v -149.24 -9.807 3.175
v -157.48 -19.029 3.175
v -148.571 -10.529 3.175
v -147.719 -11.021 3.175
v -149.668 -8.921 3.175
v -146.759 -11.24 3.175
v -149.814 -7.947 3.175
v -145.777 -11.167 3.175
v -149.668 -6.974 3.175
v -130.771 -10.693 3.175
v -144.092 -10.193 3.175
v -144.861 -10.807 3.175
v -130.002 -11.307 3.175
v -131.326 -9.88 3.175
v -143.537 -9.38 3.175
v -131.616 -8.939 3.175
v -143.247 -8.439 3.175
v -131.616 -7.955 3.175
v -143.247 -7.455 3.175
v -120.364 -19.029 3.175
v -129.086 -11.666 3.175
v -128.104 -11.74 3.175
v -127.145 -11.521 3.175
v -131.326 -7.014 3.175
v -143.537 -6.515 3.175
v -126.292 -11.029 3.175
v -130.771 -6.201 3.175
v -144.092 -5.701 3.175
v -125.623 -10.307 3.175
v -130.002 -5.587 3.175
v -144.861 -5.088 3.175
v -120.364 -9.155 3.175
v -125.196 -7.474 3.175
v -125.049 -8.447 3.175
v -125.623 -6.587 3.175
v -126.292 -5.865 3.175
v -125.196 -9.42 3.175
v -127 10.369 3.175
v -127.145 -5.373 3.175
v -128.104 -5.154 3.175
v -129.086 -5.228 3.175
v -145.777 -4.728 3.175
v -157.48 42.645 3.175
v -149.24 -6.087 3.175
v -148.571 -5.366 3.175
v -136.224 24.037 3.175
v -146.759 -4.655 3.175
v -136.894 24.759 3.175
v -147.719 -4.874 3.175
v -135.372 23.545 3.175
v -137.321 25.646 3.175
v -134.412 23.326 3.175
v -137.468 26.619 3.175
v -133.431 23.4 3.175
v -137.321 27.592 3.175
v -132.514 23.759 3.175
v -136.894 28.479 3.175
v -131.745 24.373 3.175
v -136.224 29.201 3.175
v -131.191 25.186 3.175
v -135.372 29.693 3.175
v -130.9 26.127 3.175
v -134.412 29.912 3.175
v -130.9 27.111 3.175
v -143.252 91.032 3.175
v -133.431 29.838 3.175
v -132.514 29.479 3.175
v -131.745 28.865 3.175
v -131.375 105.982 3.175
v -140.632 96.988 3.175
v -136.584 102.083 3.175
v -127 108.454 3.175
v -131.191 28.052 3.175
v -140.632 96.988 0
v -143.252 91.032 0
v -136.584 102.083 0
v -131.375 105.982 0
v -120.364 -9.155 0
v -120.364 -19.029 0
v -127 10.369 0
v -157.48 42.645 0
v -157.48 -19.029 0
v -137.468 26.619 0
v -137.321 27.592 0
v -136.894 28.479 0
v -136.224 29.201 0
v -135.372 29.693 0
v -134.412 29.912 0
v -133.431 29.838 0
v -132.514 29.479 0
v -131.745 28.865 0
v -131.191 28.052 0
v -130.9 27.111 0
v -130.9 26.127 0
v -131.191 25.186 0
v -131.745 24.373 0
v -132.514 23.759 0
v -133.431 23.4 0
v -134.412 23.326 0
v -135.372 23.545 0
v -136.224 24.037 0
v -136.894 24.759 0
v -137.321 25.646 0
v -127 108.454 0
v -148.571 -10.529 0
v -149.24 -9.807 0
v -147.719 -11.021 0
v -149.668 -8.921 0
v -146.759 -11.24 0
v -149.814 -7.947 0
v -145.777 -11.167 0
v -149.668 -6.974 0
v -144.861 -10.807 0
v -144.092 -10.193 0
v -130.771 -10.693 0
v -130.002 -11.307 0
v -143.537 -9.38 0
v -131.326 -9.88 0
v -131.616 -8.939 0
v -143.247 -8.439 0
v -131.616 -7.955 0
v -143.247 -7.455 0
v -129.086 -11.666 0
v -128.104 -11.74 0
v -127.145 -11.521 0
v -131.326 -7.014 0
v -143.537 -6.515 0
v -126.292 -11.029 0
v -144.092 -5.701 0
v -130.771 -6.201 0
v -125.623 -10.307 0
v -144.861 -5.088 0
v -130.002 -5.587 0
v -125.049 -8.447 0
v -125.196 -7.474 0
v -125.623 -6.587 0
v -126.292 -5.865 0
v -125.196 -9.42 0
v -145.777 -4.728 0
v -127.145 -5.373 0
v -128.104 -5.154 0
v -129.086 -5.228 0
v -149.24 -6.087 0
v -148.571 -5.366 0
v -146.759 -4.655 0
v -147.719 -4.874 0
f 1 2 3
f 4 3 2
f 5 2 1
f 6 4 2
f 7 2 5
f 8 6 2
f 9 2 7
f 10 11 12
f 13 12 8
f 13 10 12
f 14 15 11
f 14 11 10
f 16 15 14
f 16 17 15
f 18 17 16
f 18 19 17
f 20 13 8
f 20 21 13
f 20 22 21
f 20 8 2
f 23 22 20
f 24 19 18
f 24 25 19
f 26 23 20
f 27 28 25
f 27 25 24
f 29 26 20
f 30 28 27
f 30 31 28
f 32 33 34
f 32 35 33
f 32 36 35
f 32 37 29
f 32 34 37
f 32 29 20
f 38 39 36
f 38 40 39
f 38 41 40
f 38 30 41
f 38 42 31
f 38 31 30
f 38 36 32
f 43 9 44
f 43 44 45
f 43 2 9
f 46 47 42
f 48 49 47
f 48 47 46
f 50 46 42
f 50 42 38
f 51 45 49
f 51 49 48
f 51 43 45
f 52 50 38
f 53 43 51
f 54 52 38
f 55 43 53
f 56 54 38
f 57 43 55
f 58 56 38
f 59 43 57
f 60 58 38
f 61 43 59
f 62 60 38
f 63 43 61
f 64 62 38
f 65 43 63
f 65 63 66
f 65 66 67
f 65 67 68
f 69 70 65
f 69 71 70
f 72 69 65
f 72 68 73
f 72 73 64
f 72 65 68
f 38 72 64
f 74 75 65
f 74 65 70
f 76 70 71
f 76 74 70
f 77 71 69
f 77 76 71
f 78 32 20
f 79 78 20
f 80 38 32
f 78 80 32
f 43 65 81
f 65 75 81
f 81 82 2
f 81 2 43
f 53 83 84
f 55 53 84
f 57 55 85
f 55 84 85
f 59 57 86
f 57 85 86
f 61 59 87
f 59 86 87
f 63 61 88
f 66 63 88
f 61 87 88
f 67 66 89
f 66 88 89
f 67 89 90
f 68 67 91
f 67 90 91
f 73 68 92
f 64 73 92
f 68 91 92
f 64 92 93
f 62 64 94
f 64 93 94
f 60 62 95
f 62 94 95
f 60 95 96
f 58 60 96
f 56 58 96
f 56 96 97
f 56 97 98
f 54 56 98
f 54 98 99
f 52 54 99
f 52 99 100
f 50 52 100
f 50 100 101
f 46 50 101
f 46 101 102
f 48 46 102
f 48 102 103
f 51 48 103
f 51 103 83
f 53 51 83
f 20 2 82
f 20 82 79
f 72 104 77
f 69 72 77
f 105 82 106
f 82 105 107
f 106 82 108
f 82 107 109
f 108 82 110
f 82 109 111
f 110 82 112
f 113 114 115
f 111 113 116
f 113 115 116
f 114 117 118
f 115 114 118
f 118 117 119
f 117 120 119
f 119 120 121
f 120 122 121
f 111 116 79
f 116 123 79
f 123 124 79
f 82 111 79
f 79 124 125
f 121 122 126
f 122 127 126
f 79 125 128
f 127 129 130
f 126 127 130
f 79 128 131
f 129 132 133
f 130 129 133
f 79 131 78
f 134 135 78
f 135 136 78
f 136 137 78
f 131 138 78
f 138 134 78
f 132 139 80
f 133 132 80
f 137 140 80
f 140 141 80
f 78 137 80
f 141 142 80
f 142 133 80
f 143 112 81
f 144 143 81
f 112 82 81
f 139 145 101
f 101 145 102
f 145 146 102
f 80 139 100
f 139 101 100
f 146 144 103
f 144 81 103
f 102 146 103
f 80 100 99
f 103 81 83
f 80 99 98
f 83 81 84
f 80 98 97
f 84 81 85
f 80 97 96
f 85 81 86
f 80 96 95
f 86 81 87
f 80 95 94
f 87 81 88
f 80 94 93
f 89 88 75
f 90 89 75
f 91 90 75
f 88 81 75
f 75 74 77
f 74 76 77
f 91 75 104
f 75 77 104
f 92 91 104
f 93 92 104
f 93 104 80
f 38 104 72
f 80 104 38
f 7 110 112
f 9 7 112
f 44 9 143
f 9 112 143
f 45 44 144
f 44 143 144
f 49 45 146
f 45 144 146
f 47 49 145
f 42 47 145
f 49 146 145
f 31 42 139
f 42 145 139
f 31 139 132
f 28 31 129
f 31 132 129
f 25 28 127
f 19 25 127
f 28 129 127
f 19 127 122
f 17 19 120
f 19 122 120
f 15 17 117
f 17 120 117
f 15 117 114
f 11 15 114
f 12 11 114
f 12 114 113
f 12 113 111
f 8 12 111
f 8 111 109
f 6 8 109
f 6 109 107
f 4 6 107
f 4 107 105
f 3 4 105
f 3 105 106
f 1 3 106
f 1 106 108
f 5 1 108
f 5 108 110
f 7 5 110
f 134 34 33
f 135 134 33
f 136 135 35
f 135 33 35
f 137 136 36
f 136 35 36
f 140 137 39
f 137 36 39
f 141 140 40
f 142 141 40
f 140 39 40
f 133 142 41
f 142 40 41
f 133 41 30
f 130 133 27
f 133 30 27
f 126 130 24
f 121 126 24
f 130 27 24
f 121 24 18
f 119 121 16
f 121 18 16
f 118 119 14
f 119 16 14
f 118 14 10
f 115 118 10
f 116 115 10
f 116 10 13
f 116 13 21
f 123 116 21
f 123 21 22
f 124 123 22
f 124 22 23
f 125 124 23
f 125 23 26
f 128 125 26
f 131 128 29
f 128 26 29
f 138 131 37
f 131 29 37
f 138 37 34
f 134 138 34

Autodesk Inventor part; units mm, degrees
ref_plane "YZ Plane" through (0, 0, 0) normal (1, 0, 0) x (0, 1, 0)
ref_plane "XZ Plane" through (0, 0, 0) normal (0, 1, 0) x (-1, 0, 0)
ref_plane "XY Plane" through (0, 0, 0) normal (0, 0, 1) x (1, 0, 0)
sketch "Sketch1" plane through (0, 0, 0) normal (0, 0, 1) x (1, 0, 0)
  line L0 (-114.3, 77.8543) -> (-127, 77.8543)
  line L1 (-127, 77.8543) -> (-163.2323, 36.0005)
  arc A0 (-163.2323, 36.0005) -> (-215.9, -105.3078) centre (0, -105.3078) ccw
  line L2 (-152.4, -105.3078) -> (-215.9, -105.3078)
  arc A1 (152.4, -105.3078) -> (-152.4, -105.3078) centre (0, -105.3078) ccw
  line L3 (215.9, -105.3078) -> (152.4, -105.3078)
  arc A2 (215.9, -105.3078) -> (163.2323, 36.0005) centre (0, -105.3078) ccw
  line L4 (163.2323, 36.0005) -> (127, 77.8543)
  line L5 (127, 77.8543) -> (114.3, 77.8543)
  line L6 (114.3, 77.8543) -> (114.3, 90.5543)
  line L7 (114.3, 90.5543) -> (46.5518, 105.5138)
  arc A3 (46.5518, 105.5138) -> (-46.5518, 105.5138) centre (0, -105.3078) ccw
  line L8 (-46.5518, 105.5138) -> (-114.3, 90.5543)
  line L9 (-114.3, 90.5543) -> (-114.3, 77.8543)
  circle A4 centre (-174.6359, -42.9949) radius 3.302
  circle A5 centre (-181.5133, -67.4461) radius 3.302
  circle A6 centre (-184.9846, -92.6078) radius 3.302
  circle A7 centre (-12.7, 63.1241) radius 3.302
  circle A8 centre (-37.8617, 76.2055) radius 3.302
  circle A9 centre (-62.0706, 51.784) radius 3.302
  circle A10 centre (12.7, 63.1241) radius 3.302
  circle A11 centre (62.0706, 51.784) radius 3.302
  circle A12 centre (62.3129, 69.3281) radius 3.302
  circle A13 centre (174.6359, -42.9949) radius 3.302
  circle A14 centre (164.6231, -67.4949) radius 3.302
  circle A15 centre (181.5133, -67.4461) radius 3.302
  circle A16 centre (184.9846, -92.6078) radius 3.302
  circle A17 centre (168.4319, -92.6078) radius 3.302
  circle A18 centre (157.0918, -43.2372) radius 3.302
  circle A19 centre (37.8617, 76.2055) radius 3.302
  circle A20 centre (37.8128, 59.3154) radius 3.302
  circle A21 centre (12.7, 79.6768) radius 3.302
  circle A22 centre (-62.3129, 69.3281) radius 3.302
  circle A23 centre (-37.8128, 59.3154) radius 3.302
  circle A24 centre (-12.7, 79.6768) radius 3.302
  circle A25 centre (-168.4319, -92.6078) radius 3.302
  circle A26 centre (-164.6231, -67.4949) radius 3.302
  circle A27 centre (-157.0918, -43.2372) radius 3.302
  line L10 (-127, 143.7166) -> (-127, -105.3078)
  line L11 (-127, -21.0655) -> (-127, 108.4537)
  line L12 (-142.24, -21.0655) -> (-142.24, 38.6612) construction
  circle A28 centre (-142.24, -7.2274) radius 3.302
  circle A29 centre (-142.24, 18.1726) radius 3.302
  line L13 (-157.48, -21.0655) -> (-157.48, 42.6453)
  line L14 (-127, -21.0655) -> (-157.48, -21.0655)
  line L15 (-127, 108.4537) -> (-131.3752, 105.9825)
  line L16 (-143.2518, 91.0321) -> (-157.48, 42.6453)
  arc A30 (-131.3752, 105.9825) -> (-143.2518, 91.0321) centre (-118.8834, 83.8665) ccw
  circle A31 centre (142.24, 14.8706) radius 3.302
  circle A32 centre (-142.24, 14.8706) radius 3.302
  circle A33 centre (-142.24, -10.5294) radius 3.302
  circle A34 centre (142.24, -10.5294) radius 3.302
  point P0 (0, 0)
  dimension "d1" = 6.604
  dimension "d2" = 6.604
  dimension "d3" = 25.4
  dimension "d6" = 15.24
  dimension "d7" = 15.24
  dimension "d8" = 25.4
extrude "Extrusion1" add sketch "Sketch1" along normal blind 3.175 contours L10 L14 L13 L1 | L1 L16 A30 L15 L10 | A28 A33 | A29 A32 picked at (-142.4059, -12.7065) picked at (-142.4059, 12.6935)
sketch "Sketch2" plane through (0, 0, 0) normal (0, 0, -1) x (-1, 0, 0)
  line L0 (127, -21.0655) -> (127, 108.4537)
  line L1 (157.48, 42.6453) -> (157.48, -21.0655)
  line L2 (127, -21.0655) -> (157.48, -21.0655)
  line L3 (157.48, -21.0655) -> (157.48, -15.2234)
  line L4 (157.48, -15.2234) -> (127, -15.2234)
  line L5 (127, -15.2234) -> (127, -21.0655)
  point P0 (0, 0)
extrude "Extrusion2" cut sketch "Sketch2" against normal blind 25.4
sketch "Sketch3" plane through (0, 0, 0) normal (0, 0, -1) x (-1, 0, 0)
  line L0 (127, -15.2234) -> (157.48, -15.2234)
  line L1 (157.48, 42.6453) -> (157.48, -15.2234)
  line L2 (143.2518, 91.0321) -> (157.48, 42.6453)
  arc A0 (143.2518, 91.0321) -> (131.3752, 105.9825) centre (118.8834, 83.8665) ccw
  line L3 (127, 108.4537) -> (131.3752, 105.9825)
  line L4 (127, -15.2234) -> (127, 108.4537)
  circle A1 centre (142.24, 18.1726) radius 3.302
  circle A2 centre (142.24, -7.2274) radius 3.302
  circle A3 centre (128.3509, -8.4471) radius 3.302
  line L5 (157.48, 42.6453) -> (157.48, -15.2234)
  line L6 (157.48, -15.2234) -> (127, -15.2234)
  line L7 (127, -15.2234) -> (127, -19.0291)
  line L8 (127, -19.0291) -> (157.48, -19.0291)
  line L9 (157.48, -19.0291) -> (157.48, -15.2234)
  circle A4 centre (25.4, 77.2006) radius 3.302
  circle A5 centre (50.4225, 72.8376) radius 3.302
  circle A6 centre (73.8239, 46.08) radius 3.302
  circle A7 centre (159.4716, -56.8709) radius 3.302
  circle A8 centre (155.1086, -31.8485) radius 3.302
  circle A9 centre (146.5122, -7.9473) radius 3.302
  circle A10 centre (137.9833, -107.1921) radius 3.302
  circle A11 centre (159.4716, -82.2709) radius 3.302
  circle A12 centre (146.5122, -131.1945) radius 3.302
  circle A13 centre (74.3236, -203.3832) radius 3.302
  circle A14 centre (25.4, -199.763) radius 3.302
  circle A15 centre (25.4, -216.3425) radius 3.302
  circle A16 centre (50.4225, -211.9795) radius 3.302
  circle A17 centre (50.3212, -194.8542) radius 3.302
  circle A18 centre (73.8239, -185.2218) radius 3.302
  circle A19 centre (155.1086, -107.2934) radius 3.302
  circle A20 centre (142.892, -82.2709) radius 3.302
  circle A21 centre (128.3509, -130.6948) radius 3.302
  circle A22 centre (128.3509, -8.4471) radius 3.302
  circle A23 centre (137.9833, -31.9498) radius 3.302
  circle A24 centre (142.892, -56.8709) radius 3.302
  circle A25 centre (74.3236, 64.2413) radius 3.302
  circle A26 centre (50.3212, 55.7124) radius 3.302
  circle A27 centre (25.4, 60.6211) radius 3.302
  arc A28 (12.7, -234.6709) -> (12.7, 95.5291) centre (12.7, -69.5709) ccw
  line L10 (12.7, 95.5291) -> (12.7, 44.7291)
  arc A29 (12.7, -183.8709) -> (12.7, 44.7291) centre (12.7, -69.5709) ccw
  line L11 (12.7, -183.8709) -> (12.7, -234.6709)
  line L12 (142.24, -19.0291) -> (127, 3.43)
  point P0 (0, 0)
extrude "Extrusion4" add sketch "Sketch3" against normal blind 3.175 contours L12 L4 A28 L1 L0 | L0 L9 L8 L12 | A28 L4 L3 A0 L2 L1 | A1 | A2 A9 | A9 A2 picked at (144.0113, -7.5677) picked at (141.8341, -7.293)
sketch "Sketch4" plane through (0, 0, 0) normal (0, 0, -1) x (-1, 0, 0)
  circle A0 centre (25.4, 77.2006) radius 3.302
  circle A1 centre (50.4225, 72.8376) radius 3.302
  circle A2 centre (73.8239, 46.08) radius 3.302
  circle A3 centre (159.4716, -56.8709) radius 3.302
  circle A4 centre (155.1086, -31.8485) radius 3.302
  circle A5 centre (146.5122, -7.9473) radius 3.302
  circle A6 centre (137.9833, -107.1921) radius 3.302
  circle A7 centre (159.4716, -82.2709) radius 3.302
  circle A8 centre (146.5122, -131.1945) radius 3.302
  circle A9 centre (74.3236, -203.3832) radius 3.302
  circle A10 centre (25.4, -199.763) radius 3.302
  circle A11 centre (25.4, -216.3425) radius 3.302
  circle A12 centre (50.4225, -211.9795) radius 3.302
  circle A13 centre (50.3212, -194.8542) radius 3.302
  circle A14 centre (73.8239, -185.2218) radius 3.302
  circle A15 centre (155.1086, -107.2934) radius 3.302
  circle A16 centre (142.892, -82.2709) radius 3.302
  circle A17 centre (128.3509, -130.6948) radius 3.302
  circle A18 centre (128.3509, -8.4471) radius 3.302
  circle A19 centre (137.9833, -31.9498) radius 3.302
  circle A20 centre (142.892, -56.8709) radius 3.302
  circle A21 centre (74.3236, 64.2413) radius 3.302
  circle A22 centre (50.3212, 55.7124) radius 3.302
  circle A23 centre (25.4, 60.6211) radius 3.302
  arc A24 (12.7, -234.6709) -> (12.7, 95.5291) centre (12.7, -69.5709) ccw
  line L0 (12.7, 95.5291) -> (12.7, 44.7291)
  arc A25 (12.7, -183.8709) -> (12.7, 44.7291) centre (12.7, -69.5709) ccw
  line L1 (12.7, -183.8709) -> (12.7, -234.6709)
  line L2 (127, -15.2234) -> (127, 108.4537)
  line L3 (127, -15.2234) -> (139.6576, -15.2234)
  line L4 (139.6576, -15.2234) -> (142.24, -19.0291)
  line L5 (142.24, -19.0291) -> (157.48, -19.0291)
  line L6 (157.48, 42.6453) -> (157.48, -19.0291)
  line L7 (143.2518, 91.0321) -> (157.48, 42.6453)
  arc A26 (143.2518, 91.0321) -> (131.3752, 105.9825) centre (118.8834, 83.8665) ccw
  line L8 (127, 108.4537) -> (131.3752, 105.9825)
  line L9 (127, -15.2234) -> (139.6576, -15.2234)
  line L10 (142.24, -19.0291) -> (139.6576, -15.2234)
  line L11 (142.24, -19.0291) -> (127, 8.7406)
  line L12 (127, -15.2234) -> (127, 108.4537)
  line L13 (142.24, -19.0291) -> (123.8625, -20.0167)
  line L14 (123.8625, -20.0167) -> (123.8625, 8.7406)
  line L15 (123.8625, 8.7406) -> (127, 8.7406)
  circle A27 centre (12.7, -69.5709) radius 147.32
  circle A28 centre (134.1655, 26.6191) radius 3.302
  point P0 (0, 0)
  dimension "d17" = 6.604
  dimension "d18" = 154.94
extrude "Extrusion5" cut sketch "Sketch4" against normal blind 6.604 contours L11 L4 L3 L2 A18 | A18 L2 | A28 picked at (128.551, -8.4471)
sketch "Sketch5" plane through (0, 0, 0) normal (0, 0, -1) x (-1, 0, 0)
  circle A0 centre (25.4, 77.2006) radius 3.302
  circle A1 centre (50.4225, 72.8376) radius 3.302
  circle A2 centre (73.8239, 46.08) radius 3.302
  circle A3 centre (159.4716, -56.8709) radius 3.302
  circle A4 centre (155.1086, -31.8485) radius 3.302
  circle A5 centre (146.5122, -7.9473) radius 3.302
  circle A6 centre (137.9833, -107.1921) radius 3.302
  circle A7 centre (159.4716, -82.2709) radius 3.302
  circle A8 centre (146.5122, -131.1945) radius 3.302
  circle A9 centre (74.3236, -203.3832) radius 3.302
  circle A10 centre (25.4, -199.763) radius 3.302
  circle A11 centre (25.4, -216.3425) radius 3.302
  circle A12 centre (50.4225, -211.9795) radius 3.302
  circle A13 centre (50.3212, -194.8542) radius 3.302
  circle A14 centre (73.8239, -185.2218) radius 3.302
  circle A15 centre (155.1086, -107.2934) radius 3.302
  circle A16 centre (142.892, -82.2709) radius 3.302
  circle A17 centre (128.3509, -130.6948) radius 3.302
  circle A18 centre (128.3509, -8.4471) radius 3.302
  circle A19 centre (137.9833, -31.9498) radius 3.302
  circle A20 centre (142.892, -56.8709) radius 3.302
  circle A21 centre (74.3236, 64.2413) radius 3.302
  circle A22 centre (50.3212, 55.7124) radius 3.302
  circle A23 centre (25.4, 60.6211) radius 3.302
  arc A24 (12.7, -234.6709) -> (12.7, 95.5291) centre (12.7, -69.5709) ccw
  line L0 (12.7, 95.5291) -> (12.7, 44.7291)
  arc A25 (12.7, -183.8709) -> (12.7, 44.7291) centre (12.7, -69.5709) ccw
  line L1 (12.7, -183.8709) -> (12.7, -234.6709)
  point P0 (0, 0)
extrude "Extrusion6" cut sketch "Sketch5" against normal blind 6.604 contours A5
fillet "Fillet1" radius 6.35 1 edges at (-127, 8.7406, 1.5875)
sketch "Sketch6" plane through (0, 0, 3.175) normal (0, 0, 1) x (1, 0, 0)
  circle A0 centre (-128.3509, -8.4471) radius 3.302
  arc A1 (-127.7832, 7.3135) -> (-127, 10.3686) centre (-133.35, 10.3686) ccw
  line L0 (-127, 10.3686) -> (-127, 108.4537)
  line L1 (-127, 108.4537) -> (-131.3752, 105.9825)
  arc A2 (-131.3752, 105.9825) -> (-143.2518, 91.0321) centre (-118.8834, 83.8665) ccw
  line L2 (-143.2518, 91.0321) -> (-157.48, 42.6453)
  line L3 (-157.48, 42.6453) -> (-157.48, -19.0291)
  line L4 (-157.48, -19.0291) -> (-142.24, -19.0291)
  line L5 (-142.24, -19.0291) -> (-127.7832, 7.3135)
  circle A3 centre (-146.5122, -7.9473) radius 3.302
  circle A4 centre (-134.1655, 26.6191) radius 3.302
  line L6 (-127.7832, 7.3135) -> (-142.24, -19.0291)
  line L7 (-142.24, -19.0291) -> (-120.3644, -19.0291)
  line L8 (-127, 10.3686) -> (-127, 108.4537)
  line L9 (-127, 10.3686) -> (-120.3644, -9.1547)
  line L10 (-120.3644, -9.1547) -> (-120.3644, -19.0291)
  line L11 (-142.24, -19.0291) -> (-127, 10.3686)
  point P0 (0, 0)
extrude "Extrusion7" add sketch "Sketch6" against normal blind 3.175 contours A1 L9 L10 L7 L5
equation "\"d19\" = d17"
equation "\"d21\" = d17"
properties part number "13in coil holder plate" material "PVC-Piping"
